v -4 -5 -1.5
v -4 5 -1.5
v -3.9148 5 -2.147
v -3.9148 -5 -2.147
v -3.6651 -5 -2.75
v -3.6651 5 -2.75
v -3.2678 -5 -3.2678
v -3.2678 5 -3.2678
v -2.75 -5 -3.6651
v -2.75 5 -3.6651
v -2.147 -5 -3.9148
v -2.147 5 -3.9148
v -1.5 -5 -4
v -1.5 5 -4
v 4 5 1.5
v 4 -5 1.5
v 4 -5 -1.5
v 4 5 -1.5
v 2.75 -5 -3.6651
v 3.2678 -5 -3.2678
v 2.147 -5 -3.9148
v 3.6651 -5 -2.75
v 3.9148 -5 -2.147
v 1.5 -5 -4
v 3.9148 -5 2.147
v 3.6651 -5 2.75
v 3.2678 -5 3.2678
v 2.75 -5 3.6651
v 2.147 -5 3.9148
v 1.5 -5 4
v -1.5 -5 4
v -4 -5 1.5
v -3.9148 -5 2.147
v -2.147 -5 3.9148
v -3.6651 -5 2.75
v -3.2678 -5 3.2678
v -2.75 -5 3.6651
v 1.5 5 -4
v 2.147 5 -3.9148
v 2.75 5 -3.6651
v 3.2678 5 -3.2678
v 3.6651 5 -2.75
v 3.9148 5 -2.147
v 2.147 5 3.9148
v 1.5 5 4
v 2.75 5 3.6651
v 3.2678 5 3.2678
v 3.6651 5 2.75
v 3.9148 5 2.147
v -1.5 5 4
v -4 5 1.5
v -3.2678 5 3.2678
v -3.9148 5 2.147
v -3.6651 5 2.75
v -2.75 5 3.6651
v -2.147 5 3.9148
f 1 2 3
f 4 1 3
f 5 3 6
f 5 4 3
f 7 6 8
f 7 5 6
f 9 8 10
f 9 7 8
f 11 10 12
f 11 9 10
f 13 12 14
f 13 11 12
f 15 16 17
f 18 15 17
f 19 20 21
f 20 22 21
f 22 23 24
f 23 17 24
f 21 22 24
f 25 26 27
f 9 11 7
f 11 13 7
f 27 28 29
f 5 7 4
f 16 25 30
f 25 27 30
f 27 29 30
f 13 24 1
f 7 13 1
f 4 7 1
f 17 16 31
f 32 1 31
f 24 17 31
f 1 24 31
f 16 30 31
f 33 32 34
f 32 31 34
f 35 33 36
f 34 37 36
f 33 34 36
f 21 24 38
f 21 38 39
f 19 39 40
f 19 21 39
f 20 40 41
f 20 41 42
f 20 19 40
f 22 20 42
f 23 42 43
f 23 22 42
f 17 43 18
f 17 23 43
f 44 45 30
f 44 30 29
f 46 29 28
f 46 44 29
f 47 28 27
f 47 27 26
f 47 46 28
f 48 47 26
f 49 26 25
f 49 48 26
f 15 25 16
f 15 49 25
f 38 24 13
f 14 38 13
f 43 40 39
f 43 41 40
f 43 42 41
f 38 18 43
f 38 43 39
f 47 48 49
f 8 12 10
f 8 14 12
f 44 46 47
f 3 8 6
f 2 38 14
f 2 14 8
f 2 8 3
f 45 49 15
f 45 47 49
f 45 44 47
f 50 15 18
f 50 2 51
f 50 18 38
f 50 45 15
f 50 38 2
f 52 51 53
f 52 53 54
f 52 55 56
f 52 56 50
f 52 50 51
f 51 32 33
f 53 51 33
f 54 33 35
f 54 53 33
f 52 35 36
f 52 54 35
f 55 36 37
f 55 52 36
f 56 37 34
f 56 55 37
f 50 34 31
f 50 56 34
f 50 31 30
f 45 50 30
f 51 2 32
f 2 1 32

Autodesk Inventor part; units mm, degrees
ref_plane "YZ Plane" through (0, 0, 0) normal (1, 0, 0) x (0, 1, 0)
ref_plane "XZ Plane" through (0, 0, 0) normal (0, 1, 0) x (-1, 0, 0)
ref_plane "XY Plane" through (0, 0, 0) normal (0, 0, 1) x (1, 0, 0)
sketch "Sketch1" plane through (0, 0, 0) normal (0, 1, 0) x (-1, 0, 0)
  line L0 (4, 4) -> (-4, 4)
  line L1 (-4, 4) -> (-4, -4)
  line L2 (-4, -4) -> (4, -4)
  line L3 (4, -4) -> (4, 4)
  line L4 (4, 4) -> (-4, -4) construction
  line L5 (-4, 4) -> (4, -4) construction
  point P0 (0, 0)
  dimension "d0" = 8
  dimension "d1" = 8
extrude "Extrusion1" add sketch "Sketch1" along normal mid plane 10
fillet "Fillet1" radius 2.5 4 edges at (4, 0, 4) (4, 0, -4) (-4, 0, 4) (-4, 0, -4)
properties part number "Rounded Square"
